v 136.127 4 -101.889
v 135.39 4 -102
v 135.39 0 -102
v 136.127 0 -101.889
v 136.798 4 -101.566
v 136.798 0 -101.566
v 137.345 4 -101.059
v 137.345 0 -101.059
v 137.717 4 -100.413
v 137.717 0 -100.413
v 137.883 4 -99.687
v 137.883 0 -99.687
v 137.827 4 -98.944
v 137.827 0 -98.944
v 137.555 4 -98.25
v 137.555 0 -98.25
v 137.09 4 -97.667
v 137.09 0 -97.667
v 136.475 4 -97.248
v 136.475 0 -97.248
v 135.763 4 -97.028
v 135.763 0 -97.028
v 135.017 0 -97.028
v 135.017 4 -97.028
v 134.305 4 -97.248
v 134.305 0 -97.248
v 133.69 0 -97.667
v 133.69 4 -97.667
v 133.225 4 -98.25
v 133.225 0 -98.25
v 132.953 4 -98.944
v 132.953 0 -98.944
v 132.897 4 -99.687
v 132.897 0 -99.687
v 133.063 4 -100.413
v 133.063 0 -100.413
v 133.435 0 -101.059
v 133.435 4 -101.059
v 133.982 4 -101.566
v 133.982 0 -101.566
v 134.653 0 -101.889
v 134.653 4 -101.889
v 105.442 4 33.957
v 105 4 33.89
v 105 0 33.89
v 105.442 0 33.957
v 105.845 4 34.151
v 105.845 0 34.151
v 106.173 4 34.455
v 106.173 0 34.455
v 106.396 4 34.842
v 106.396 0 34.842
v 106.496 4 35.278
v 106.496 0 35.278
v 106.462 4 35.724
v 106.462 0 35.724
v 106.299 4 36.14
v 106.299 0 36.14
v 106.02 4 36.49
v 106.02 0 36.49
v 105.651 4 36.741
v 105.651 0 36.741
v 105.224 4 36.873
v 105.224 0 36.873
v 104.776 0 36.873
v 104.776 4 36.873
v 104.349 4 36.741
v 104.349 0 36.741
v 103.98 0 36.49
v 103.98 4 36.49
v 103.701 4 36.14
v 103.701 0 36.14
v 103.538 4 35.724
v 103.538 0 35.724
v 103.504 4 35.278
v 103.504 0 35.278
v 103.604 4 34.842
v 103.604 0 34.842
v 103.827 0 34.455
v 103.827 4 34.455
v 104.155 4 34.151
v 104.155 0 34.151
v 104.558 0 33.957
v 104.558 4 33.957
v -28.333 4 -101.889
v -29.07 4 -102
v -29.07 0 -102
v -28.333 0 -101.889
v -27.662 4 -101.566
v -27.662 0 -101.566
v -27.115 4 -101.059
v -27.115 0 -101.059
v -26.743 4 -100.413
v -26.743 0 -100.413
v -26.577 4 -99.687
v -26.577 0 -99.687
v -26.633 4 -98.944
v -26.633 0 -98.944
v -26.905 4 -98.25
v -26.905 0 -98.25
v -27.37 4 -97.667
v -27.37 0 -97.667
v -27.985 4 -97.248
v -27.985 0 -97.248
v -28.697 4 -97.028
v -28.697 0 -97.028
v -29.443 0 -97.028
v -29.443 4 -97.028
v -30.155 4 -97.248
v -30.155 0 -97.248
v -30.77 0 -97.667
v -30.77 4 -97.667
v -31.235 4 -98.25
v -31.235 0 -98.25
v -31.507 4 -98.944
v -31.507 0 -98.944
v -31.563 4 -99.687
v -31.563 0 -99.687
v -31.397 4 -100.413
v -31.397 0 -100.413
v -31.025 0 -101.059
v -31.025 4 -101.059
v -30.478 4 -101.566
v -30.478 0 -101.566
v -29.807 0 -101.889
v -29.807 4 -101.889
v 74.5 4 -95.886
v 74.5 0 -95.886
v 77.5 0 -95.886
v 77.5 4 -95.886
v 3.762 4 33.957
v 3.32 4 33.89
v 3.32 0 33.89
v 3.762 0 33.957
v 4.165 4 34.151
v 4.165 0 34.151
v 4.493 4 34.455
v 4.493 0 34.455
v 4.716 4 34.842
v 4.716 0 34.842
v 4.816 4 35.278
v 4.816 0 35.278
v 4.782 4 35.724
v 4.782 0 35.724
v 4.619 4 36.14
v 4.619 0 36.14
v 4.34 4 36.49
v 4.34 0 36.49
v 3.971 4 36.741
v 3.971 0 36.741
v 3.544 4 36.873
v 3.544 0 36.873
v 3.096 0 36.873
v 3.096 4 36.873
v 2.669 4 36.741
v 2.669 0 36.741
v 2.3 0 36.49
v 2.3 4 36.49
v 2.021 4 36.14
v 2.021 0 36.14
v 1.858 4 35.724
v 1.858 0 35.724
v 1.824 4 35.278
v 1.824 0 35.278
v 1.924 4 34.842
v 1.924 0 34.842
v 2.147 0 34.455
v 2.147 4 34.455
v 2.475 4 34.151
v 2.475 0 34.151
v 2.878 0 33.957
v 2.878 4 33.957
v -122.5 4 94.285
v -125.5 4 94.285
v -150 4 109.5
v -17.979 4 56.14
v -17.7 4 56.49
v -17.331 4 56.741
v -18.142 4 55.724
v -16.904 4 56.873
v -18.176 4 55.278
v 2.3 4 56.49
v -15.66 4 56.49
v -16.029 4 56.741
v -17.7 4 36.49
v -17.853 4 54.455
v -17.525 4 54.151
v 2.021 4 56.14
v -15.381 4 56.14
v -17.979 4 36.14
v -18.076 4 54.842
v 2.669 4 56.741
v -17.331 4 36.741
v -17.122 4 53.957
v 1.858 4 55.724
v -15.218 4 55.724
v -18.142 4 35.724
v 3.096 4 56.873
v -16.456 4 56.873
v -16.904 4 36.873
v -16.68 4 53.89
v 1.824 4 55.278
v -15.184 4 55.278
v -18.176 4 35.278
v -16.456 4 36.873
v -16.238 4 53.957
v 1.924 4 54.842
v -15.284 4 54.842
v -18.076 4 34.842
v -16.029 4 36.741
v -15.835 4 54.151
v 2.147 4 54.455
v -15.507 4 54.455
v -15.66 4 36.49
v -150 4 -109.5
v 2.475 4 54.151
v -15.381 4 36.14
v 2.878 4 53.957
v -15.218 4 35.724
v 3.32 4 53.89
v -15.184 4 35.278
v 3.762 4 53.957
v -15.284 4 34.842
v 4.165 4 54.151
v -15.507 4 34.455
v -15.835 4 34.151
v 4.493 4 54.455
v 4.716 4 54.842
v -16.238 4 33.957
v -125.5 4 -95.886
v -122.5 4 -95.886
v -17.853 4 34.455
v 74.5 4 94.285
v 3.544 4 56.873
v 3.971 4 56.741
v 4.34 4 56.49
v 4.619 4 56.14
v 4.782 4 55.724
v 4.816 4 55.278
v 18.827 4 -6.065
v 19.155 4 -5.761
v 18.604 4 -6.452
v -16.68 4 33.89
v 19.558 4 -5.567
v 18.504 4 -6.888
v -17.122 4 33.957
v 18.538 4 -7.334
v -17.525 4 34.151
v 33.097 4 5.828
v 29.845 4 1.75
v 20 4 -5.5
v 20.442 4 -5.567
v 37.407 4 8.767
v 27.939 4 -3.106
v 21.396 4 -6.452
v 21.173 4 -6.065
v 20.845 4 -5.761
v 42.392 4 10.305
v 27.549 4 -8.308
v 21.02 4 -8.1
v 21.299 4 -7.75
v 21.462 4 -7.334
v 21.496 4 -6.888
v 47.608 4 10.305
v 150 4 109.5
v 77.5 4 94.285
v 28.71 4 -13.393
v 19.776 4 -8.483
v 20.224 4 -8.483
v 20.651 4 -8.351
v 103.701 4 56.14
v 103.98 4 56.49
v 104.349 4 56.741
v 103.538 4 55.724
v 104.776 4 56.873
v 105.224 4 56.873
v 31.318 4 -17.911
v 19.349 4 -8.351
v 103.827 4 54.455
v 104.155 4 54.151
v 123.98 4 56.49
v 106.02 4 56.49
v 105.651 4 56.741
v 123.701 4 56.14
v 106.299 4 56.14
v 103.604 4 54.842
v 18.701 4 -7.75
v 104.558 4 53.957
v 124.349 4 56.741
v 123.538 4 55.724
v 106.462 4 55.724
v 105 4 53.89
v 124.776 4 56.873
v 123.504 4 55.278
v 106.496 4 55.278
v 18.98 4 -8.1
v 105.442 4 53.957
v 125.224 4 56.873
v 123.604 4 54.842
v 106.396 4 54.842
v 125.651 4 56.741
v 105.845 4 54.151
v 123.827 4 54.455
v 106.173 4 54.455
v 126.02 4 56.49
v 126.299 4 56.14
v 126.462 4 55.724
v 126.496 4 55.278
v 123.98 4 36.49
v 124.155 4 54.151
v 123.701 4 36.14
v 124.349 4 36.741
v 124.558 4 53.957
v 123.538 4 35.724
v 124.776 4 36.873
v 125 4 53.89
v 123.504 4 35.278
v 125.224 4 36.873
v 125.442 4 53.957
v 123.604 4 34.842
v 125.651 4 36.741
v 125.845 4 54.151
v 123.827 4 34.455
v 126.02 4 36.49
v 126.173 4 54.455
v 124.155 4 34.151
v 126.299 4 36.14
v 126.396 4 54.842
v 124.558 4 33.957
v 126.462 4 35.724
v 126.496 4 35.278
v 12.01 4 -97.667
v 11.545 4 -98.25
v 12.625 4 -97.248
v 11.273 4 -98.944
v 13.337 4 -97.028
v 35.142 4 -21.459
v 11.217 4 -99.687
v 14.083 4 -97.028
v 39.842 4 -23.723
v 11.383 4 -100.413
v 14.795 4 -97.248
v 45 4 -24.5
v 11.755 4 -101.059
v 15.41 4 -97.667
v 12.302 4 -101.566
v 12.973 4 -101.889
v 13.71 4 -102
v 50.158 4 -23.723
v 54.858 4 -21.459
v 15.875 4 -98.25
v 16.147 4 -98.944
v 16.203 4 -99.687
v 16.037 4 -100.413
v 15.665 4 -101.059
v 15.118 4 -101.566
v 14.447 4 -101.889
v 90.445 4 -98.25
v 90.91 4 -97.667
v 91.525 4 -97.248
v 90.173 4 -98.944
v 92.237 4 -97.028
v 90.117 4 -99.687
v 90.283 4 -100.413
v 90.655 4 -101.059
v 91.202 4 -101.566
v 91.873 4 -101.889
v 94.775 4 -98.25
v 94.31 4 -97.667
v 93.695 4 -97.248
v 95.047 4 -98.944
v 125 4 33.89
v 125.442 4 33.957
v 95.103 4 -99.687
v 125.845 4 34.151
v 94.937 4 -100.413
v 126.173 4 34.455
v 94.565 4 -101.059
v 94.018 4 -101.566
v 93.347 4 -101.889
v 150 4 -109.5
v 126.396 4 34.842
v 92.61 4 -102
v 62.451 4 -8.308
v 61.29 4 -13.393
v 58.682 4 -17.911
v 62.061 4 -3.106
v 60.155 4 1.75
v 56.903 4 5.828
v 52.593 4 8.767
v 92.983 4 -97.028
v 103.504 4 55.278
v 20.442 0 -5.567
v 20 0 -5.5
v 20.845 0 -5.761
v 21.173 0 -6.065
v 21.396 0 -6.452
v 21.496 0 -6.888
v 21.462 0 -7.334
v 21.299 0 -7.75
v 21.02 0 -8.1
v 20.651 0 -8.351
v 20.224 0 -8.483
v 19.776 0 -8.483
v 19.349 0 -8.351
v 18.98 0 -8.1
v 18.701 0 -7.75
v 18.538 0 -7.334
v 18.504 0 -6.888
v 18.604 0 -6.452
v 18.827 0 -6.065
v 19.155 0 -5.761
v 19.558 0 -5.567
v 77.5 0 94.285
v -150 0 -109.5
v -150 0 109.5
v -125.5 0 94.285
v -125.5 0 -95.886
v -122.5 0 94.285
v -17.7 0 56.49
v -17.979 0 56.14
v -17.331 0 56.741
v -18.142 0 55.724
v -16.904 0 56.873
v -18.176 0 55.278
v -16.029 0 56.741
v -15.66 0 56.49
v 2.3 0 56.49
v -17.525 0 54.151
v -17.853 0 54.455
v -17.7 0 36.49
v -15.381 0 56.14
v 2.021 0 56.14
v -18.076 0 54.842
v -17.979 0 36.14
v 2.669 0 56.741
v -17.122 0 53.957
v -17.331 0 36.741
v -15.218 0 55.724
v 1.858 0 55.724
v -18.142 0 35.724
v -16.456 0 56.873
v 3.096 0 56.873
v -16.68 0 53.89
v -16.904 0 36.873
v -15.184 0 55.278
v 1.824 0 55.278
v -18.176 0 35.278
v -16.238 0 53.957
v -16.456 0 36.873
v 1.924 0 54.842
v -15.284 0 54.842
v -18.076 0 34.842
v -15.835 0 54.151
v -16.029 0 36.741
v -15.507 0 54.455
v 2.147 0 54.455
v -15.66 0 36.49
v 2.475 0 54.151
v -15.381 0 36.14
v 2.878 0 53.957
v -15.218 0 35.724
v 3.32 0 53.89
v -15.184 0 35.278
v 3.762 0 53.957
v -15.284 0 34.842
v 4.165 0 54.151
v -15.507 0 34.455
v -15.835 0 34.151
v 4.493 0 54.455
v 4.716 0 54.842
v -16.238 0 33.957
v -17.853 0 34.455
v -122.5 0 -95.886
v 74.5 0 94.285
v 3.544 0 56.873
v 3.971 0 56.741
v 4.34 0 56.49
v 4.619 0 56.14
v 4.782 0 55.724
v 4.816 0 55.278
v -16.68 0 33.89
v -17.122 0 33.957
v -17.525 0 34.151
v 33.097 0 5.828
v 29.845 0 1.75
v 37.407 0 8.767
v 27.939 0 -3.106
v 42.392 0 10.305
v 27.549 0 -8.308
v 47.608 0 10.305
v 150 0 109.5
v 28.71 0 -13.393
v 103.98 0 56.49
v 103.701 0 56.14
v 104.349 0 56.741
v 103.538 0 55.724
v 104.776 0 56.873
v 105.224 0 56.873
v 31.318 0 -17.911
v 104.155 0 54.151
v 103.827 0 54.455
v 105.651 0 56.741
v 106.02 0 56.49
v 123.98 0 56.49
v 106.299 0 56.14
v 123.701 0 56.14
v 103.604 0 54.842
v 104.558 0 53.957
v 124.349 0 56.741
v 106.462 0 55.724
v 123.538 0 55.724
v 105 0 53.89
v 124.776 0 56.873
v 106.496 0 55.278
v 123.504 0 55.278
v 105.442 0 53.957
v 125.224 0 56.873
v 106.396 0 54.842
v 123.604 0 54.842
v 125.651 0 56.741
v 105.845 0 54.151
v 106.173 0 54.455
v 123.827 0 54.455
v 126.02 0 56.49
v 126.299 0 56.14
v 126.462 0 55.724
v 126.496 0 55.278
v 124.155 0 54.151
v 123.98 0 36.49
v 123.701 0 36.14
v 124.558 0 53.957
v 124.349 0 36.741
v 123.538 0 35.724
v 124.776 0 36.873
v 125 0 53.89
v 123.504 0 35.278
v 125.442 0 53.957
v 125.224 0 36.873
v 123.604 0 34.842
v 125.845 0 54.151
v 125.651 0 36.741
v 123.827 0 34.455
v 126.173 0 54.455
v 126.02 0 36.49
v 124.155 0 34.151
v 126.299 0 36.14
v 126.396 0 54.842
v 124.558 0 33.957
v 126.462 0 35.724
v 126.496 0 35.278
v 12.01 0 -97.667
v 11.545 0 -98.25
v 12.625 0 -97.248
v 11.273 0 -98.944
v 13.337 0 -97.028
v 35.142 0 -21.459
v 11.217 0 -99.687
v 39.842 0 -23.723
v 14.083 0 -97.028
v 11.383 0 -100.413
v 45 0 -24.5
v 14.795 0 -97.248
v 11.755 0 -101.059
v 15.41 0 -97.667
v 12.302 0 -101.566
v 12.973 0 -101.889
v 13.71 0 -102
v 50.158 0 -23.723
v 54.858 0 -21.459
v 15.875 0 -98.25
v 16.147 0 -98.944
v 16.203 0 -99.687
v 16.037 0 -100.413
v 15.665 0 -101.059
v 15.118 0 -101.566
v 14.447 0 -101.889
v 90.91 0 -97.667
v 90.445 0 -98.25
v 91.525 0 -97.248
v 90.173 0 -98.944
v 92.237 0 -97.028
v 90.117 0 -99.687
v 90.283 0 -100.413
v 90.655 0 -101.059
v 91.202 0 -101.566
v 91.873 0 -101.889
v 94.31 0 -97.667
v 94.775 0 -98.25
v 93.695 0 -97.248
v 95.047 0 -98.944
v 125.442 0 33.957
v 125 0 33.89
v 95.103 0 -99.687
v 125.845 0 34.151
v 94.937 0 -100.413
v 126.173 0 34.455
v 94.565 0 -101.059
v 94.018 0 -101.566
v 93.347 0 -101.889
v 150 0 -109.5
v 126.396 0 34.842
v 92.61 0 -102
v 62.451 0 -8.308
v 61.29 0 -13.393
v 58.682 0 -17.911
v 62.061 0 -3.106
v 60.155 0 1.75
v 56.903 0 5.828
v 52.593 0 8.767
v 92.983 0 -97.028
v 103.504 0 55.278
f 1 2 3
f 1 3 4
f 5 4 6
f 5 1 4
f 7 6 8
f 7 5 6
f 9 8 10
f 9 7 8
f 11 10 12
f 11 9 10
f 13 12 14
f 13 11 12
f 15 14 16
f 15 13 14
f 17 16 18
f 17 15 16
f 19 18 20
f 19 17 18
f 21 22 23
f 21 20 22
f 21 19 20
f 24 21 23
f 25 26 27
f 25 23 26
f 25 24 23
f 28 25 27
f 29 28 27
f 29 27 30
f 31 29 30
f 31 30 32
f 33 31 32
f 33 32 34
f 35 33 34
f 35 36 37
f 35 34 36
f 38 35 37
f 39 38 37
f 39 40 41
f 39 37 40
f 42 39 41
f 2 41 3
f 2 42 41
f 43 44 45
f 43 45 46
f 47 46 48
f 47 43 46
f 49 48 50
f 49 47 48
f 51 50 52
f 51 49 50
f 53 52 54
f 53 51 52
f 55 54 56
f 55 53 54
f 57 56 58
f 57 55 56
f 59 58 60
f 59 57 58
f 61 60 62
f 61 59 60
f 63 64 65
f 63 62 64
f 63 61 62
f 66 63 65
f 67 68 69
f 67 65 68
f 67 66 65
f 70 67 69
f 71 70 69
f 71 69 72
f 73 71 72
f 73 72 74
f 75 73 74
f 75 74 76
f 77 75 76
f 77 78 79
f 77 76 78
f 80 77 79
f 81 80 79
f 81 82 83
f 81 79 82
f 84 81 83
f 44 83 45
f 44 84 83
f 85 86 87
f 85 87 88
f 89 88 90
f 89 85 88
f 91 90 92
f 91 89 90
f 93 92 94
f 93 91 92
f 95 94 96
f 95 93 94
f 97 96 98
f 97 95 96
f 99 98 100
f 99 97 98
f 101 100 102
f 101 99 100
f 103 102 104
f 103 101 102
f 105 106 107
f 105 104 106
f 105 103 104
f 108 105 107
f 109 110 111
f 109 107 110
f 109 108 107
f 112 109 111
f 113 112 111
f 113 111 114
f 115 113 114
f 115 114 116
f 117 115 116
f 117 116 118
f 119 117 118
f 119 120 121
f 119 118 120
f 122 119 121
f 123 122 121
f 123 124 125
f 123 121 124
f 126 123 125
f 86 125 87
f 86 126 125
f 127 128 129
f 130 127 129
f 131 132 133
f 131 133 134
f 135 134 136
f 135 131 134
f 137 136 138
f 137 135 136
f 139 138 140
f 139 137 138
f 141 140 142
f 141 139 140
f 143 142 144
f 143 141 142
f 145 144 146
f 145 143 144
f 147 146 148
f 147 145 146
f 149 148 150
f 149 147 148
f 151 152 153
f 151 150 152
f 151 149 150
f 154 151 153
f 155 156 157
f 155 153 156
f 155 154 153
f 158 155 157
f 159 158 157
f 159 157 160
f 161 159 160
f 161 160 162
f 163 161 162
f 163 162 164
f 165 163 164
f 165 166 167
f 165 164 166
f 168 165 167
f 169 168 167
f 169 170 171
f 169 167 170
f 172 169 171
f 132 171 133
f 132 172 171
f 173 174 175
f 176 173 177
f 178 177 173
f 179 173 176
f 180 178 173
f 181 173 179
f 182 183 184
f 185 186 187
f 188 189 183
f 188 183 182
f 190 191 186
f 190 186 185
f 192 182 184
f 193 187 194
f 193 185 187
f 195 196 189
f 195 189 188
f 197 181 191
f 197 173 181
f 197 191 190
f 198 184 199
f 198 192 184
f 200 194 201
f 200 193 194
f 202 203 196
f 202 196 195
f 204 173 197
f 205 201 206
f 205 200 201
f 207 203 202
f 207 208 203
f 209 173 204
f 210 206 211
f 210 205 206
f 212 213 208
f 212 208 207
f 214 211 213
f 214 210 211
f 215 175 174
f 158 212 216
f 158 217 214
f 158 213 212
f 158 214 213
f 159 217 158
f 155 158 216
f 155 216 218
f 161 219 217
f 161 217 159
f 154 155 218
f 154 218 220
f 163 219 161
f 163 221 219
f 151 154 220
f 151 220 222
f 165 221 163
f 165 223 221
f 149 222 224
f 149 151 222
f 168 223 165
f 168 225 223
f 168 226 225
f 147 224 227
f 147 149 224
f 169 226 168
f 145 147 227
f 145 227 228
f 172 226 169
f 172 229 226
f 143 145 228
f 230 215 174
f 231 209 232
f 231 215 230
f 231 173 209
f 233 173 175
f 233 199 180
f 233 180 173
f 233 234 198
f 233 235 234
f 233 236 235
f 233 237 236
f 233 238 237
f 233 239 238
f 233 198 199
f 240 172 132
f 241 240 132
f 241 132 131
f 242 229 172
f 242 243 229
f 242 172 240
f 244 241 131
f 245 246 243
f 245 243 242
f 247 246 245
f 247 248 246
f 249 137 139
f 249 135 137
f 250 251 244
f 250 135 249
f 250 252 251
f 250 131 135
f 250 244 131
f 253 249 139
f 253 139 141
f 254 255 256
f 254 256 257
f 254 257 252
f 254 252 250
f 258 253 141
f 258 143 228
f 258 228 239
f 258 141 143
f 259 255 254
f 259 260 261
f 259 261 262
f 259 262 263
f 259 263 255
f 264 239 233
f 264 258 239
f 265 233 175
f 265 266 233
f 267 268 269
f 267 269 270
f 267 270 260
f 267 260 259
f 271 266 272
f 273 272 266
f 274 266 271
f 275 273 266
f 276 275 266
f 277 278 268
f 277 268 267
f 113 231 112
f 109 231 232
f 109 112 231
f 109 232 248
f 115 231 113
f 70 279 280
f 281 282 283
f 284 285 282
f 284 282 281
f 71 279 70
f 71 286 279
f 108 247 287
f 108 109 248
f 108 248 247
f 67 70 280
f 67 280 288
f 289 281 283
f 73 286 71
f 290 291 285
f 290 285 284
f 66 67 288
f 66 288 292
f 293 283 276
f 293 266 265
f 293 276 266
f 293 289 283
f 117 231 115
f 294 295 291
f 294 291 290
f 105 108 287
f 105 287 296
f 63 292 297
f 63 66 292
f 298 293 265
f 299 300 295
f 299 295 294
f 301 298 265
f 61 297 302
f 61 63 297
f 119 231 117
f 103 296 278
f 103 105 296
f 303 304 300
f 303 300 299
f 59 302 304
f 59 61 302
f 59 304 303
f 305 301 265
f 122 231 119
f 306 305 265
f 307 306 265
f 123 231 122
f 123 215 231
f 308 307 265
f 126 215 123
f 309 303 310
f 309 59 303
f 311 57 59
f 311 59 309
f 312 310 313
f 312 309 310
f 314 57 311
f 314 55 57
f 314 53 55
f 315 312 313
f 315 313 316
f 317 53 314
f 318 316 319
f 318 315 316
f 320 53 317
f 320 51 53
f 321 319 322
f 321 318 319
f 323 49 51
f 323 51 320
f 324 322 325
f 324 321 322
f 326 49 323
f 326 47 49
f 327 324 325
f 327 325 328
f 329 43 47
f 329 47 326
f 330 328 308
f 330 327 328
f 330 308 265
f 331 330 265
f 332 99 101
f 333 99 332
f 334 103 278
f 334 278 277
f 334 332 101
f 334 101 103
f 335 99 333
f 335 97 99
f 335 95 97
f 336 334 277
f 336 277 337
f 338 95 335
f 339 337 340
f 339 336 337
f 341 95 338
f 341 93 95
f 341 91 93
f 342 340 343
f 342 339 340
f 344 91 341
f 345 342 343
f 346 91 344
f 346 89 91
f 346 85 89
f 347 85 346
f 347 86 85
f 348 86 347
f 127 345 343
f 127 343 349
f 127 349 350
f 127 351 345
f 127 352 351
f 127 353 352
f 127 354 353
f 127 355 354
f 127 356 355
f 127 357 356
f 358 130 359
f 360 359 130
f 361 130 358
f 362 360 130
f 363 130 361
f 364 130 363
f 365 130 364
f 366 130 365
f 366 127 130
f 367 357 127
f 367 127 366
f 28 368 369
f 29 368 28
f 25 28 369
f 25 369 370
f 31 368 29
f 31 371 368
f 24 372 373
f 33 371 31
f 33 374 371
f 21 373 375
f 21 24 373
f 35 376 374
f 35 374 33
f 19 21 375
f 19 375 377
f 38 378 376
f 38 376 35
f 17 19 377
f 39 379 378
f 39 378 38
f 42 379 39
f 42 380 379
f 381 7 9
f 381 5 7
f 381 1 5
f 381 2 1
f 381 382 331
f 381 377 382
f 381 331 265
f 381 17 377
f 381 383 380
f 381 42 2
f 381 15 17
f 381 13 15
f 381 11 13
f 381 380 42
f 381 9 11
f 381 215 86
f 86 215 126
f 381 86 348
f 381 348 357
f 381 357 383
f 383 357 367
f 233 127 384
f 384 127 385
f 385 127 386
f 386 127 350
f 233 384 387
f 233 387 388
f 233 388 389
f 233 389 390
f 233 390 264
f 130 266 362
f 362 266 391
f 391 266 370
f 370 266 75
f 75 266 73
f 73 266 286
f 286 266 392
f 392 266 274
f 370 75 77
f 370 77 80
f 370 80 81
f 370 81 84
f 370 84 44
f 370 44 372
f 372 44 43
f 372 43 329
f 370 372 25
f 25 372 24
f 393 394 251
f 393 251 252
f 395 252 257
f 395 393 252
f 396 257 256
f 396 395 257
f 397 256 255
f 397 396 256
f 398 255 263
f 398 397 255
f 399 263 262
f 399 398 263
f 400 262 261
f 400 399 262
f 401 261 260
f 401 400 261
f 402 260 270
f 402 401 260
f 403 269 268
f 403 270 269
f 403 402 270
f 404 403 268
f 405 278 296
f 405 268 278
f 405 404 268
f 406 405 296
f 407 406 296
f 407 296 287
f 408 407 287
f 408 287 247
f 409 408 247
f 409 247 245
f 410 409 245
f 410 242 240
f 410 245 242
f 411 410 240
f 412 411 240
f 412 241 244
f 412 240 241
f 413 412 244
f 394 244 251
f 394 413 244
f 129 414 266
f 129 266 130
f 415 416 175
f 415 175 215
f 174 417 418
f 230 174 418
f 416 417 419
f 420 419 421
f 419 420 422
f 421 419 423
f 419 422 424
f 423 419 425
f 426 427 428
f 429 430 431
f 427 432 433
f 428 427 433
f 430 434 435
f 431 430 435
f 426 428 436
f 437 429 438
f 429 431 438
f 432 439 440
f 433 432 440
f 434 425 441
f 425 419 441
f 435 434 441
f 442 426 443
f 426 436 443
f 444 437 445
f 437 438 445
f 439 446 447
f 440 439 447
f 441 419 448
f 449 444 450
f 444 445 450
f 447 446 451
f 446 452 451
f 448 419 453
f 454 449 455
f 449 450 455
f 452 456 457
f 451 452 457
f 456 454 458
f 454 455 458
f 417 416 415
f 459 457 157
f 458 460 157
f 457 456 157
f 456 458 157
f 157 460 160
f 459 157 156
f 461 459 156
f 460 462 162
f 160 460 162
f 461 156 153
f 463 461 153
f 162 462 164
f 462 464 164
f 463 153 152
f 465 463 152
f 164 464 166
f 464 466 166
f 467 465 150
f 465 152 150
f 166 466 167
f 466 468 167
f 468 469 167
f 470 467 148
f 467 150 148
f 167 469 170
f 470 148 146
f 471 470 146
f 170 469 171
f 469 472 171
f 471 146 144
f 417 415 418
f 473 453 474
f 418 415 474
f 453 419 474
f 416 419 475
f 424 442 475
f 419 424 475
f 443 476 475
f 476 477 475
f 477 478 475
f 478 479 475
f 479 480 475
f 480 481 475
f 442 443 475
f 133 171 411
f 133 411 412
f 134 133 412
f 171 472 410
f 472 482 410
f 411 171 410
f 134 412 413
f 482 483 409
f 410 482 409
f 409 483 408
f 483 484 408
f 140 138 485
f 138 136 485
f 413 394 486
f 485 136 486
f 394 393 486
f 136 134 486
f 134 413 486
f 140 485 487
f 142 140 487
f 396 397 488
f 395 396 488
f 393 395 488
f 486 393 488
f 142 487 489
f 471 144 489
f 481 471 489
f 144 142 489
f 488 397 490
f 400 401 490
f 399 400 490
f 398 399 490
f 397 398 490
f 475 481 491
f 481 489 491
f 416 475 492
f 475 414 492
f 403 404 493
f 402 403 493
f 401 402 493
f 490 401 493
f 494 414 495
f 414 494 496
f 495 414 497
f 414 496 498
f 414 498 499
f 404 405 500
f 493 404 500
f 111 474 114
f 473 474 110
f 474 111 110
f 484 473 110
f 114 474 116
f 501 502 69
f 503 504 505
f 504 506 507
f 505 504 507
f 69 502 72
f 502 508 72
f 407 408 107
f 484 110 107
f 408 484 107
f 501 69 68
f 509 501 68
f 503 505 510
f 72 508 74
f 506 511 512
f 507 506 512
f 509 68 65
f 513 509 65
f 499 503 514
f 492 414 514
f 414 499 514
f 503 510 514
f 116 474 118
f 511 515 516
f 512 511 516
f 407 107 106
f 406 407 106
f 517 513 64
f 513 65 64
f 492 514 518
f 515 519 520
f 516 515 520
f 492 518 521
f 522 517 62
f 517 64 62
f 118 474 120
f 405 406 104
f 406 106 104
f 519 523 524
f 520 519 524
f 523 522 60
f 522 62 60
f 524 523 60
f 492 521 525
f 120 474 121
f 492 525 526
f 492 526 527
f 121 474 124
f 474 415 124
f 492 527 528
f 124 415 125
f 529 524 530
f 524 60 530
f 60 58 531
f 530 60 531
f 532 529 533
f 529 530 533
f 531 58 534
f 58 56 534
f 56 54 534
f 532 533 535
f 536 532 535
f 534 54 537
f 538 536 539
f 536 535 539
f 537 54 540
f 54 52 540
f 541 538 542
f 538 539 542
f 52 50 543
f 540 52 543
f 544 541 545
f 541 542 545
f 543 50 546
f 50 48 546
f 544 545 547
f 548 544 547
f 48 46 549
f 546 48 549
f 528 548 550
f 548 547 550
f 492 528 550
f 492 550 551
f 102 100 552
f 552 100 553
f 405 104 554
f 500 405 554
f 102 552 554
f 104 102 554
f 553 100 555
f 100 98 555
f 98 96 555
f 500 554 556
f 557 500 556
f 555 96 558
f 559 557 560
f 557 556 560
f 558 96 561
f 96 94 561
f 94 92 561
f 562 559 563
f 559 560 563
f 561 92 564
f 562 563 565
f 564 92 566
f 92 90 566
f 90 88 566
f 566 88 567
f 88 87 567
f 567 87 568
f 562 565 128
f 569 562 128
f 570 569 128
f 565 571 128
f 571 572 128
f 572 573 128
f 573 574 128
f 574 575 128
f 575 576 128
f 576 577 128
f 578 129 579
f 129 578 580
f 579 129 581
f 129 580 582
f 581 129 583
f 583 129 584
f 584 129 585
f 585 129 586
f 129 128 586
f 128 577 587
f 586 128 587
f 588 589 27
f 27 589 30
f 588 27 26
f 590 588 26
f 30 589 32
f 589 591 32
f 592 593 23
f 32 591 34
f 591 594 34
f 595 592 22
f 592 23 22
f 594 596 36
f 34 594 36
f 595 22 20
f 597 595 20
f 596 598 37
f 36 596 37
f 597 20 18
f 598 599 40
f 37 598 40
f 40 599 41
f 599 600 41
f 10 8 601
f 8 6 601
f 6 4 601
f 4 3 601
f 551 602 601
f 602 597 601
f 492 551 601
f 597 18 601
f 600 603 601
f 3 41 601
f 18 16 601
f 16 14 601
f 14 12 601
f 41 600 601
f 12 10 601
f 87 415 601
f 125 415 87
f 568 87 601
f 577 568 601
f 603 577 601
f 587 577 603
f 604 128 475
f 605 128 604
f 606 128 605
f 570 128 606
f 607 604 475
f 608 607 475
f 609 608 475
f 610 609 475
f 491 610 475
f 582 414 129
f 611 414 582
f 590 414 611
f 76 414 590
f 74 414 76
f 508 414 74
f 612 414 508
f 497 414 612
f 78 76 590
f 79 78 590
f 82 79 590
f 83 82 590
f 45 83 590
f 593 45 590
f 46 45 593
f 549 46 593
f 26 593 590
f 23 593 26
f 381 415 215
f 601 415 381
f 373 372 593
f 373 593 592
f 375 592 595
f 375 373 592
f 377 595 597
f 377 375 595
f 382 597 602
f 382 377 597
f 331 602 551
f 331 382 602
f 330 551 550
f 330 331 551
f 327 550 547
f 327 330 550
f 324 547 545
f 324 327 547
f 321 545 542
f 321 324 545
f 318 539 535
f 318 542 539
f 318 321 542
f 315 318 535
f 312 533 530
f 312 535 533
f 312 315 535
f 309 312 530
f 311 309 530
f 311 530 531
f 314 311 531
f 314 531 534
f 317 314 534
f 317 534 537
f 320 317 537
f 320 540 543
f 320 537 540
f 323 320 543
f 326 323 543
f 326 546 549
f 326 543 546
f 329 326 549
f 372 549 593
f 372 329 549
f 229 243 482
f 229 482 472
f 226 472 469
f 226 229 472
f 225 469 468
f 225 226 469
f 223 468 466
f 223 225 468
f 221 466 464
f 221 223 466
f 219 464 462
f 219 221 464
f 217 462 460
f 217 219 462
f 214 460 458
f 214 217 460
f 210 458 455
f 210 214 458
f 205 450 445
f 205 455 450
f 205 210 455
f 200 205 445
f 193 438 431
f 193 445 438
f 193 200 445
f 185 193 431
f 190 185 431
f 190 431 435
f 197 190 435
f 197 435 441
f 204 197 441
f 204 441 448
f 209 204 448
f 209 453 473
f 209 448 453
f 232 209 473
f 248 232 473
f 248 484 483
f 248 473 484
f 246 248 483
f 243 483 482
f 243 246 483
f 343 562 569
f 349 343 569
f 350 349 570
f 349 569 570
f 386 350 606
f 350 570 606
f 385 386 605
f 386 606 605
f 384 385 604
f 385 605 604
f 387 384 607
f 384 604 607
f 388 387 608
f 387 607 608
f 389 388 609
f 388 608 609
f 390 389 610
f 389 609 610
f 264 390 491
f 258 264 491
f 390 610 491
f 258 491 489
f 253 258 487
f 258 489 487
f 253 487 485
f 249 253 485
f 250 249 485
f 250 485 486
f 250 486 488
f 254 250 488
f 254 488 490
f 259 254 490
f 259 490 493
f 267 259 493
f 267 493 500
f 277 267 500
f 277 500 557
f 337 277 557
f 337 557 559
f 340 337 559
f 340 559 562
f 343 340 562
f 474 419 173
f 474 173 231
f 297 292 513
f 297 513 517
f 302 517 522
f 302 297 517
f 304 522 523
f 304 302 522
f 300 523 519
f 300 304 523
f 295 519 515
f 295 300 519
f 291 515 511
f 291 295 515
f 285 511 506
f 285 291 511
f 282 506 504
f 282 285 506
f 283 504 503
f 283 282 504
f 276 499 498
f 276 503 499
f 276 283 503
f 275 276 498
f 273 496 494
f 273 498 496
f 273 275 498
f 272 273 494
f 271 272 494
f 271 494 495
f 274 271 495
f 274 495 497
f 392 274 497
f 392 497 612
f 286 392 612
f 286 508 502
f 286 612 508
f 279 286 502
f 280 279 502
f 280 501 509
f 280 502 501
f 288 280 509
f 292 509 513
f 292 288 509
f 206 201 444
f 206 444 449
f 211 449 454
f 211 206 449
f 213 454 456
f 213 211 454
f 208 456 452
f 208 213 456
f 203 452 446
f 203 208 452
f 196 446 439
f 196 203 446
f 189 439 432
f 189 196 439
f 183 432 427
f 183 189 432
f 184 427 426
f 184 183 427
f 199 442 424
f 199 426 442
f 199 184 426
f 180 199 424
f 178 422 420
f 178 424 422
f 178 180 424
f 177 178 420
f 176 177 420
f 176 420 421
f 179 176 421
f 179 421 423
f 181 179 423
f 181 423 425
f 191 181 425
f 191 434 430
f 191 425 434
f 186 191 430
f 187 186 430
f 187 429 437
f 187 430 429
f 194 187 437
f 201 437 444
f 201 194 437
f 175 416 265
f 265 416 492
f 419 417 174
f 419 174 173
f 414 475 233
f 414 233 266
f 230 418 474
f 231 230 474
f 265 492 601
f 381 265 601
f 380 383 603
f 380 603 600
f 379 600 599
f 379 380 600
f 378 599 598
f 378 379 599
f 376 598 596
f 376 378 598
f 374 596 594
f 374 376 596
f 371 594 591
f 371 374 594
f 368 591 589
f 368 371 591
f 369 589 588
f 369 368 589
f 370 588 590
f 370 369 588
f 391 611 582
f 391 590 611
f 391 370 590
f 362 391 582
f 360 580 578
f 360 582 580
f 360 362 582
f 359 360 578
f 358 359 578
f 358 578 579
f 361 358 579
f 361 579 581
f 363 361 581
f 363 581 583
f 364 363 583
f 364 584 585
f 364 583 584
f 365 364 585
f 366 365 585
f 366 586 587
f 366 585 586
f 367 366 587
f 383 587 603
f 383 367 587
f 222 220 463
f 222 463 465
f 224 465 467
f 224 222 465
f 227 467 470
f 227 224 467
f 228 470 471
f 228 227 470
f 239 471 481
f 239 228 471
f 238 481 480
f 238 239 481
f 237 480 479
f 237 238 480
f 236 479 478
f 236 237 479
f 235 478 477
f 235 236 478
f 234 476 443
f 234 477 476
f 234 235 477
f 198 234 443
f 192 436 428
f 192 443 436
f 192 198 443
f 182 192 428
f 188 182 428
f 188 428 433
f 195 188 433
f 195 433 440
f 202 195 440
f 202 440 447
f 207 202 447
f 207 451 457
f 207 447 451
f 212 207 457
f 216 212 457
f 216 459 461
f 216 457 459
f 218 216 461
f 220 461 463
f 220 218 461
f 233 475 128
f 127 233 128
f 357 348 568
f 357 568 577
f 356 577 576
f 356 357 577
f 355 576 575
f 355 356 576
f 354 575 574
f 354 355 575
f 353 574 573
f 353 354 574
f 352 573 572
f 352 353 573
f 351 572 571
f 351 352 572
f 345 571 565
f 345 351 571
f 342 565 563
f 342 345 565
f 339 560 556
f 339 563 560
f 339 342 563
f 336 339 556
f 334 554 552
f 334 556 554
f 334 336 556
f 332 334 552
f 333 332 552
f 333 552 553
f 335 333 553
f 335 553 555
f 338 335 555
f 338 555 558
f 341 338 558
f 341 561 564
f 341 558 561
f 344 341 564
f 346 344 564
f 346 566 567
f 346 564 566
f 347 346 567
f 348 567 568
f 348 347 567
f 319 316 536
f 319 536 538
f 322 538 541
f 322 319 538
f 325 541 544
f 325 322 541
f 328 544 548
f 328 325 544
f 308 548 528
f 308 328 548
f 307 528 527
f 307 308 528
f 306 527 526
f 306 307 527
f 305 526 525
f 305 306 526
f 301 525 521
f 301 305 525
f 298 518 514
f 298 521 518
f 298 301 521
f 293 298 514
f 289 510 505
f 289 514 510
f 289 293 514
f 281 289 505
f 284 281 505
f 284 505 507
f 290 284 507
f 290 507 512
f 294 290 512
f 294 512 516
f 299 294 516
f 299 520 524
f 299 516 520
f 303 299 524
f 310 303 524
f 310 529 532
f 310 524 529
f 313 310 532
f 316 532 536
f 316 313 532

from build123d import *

# Parameters (mm, degrees)
SKETCH1_W               = 300
SKETCH1_H               = 219
SKETCH1_W_2             = 3
SKETCH1_H_2             = 190.1710485
BOSS_EXTRUDE1_DEPTH     = 4
SKETCH2_R               = 17.5
CUT_EXTRUDE2_DEPTH      = 186.758579883
CUT_EXTRUDE3_DEPTH      = 186.758579883
CUT_EXTRUDE3_DEPTH_BACK = 186.758579883
SKETCH3_R               = 1.5
CUT_EXTRUDE4_DEPTH      = 186.758579883
CUT_EXTRUDE4_DEPTH_BACK = 186.758579883
SKETCH4_R               = 1.5
CUT_EXTRUDE5_DEPTH      = 186.758579883
CUT_EXTRUDE5_DEPTH_BACK = 186.758579883
SKETCH5_R               = 2.5
CUT_EXTRUDE6_DEPTH      = 186.758579883
CUT_EXTRUDE6_DEPTH_BACK = 186.758579883
SKETCH6_R               = 2.5
CUT_EXTRUDE7_DEPTH      = 186.758579883
CUT_EXTRUDE7_DEPTH_BACK = 186.758579883
SKETCH7_R               = 1.5


with BuildPart() as part:
    # Sketch1 → Boss-Extrude1 (new body)
    with BuildSketch(Plane(origin=(0, 0, 0), x_dir=(1, 0, 0), z_dir=(0, 1, 0))):
        Rectangle(SKETCH1_W, SKETCH1_H)
        with Locations((-124, 0.80041533)):
            Rectangle(SKETCH1_W_2, SKETCH1_H_2, mode=Mode.SUBTRACT)
        with Locations((76, 0.80041533)):
            Rectangle(SKETCH1_W_2, SKETCH1_H_2, mode=Mode.SUBTRACT)
    extrude(amount=BOSS_EXTRUDE1_DEPTH)

    # Sketch2 → Cut-Extrude2 (cut, through all)
    with BuildSketch(Plane(origin=(0, 0, 0), x_dir=(-1, 0, 0), z_dir=(0, -1, 0))):
        with Locations(Location((-45, 7, 0), (0, 0, 90))):
            Circle(SKETCH2_R)
    extrude(amount=-CUT_EXTRUDE2_DEPTH, mode=Mode.SUBTRACT)

    # Sketch3 → Cut-Extrude3 (cut, two sides: drawn at the far end of the back side and taken through both)
    with BuildSketch(Plane(origin=(0, 0, 0), x_dir=(-1, 0, 0), z_dir=(0, -1, 0)).offset(-CUT_EXTRUDE3_DEPTH_BACK)):
        with Locations(Location((-125, -55.39, 0), (0, 0, 90))):
            Circle(SKETCH3_R)
        with Locations(Location((-125, -35.39, 0), (0, 0, 90))):
            Circle(SKETCH3_R)
        with Locations(Location((-105, -35.39, 0), (0, 0, 90))):
            Circle(SKETCH3_R)
        with Locations(Location((-105, -55.39, 0), (0, 0, 90))):
            Circle(SKETCH3_R)
    extrude(amount=CUT_EXTRUDE3_DEPTH + CUT_EXTRUDE3_DEPTH_BACK, mode=Mode.SUBTRACT)

    # Sketch4 → Cut-Extrude4 (cut, two sides: drawn at the far end of the back side and taken through both)
    with BuildSketch(Plane(origin=(0, 0, 0), x_dir=(-1, 0, 0), z_dir=(0, -1, 0)).offset(-CUT_EXTRUDE4_DEPTH_BACK)):
        with Locations(Location((-3.32, -55.39, 0), (0, 0, 90))):
            Circle(SKETCH4_R)
        with Locations(Location((-3.32, -35.39, 0), (0, 0, 90))):
            Circle(SKETCH4_R)
        with Locations(Location((16.68, -35.39, 0), (0, 0, 90))):
            Circle(SKETCH4_R)
        with Locations(Location((16.68, -55.39, 0), (0, 0, 90))):
            Circle(SKETCH4_R)
    extrude(amount=CUT_EXTRUDE4_DEPTH + CUT_EXTRUDE4_DEPTH_BACK, mode=Mode.SUBTRACT)

    # Sketch5 → Cut-Extrude5 (cut, two sides: drawn at the far end of the back side and taken through both)
    with BuildSketch(Plane(origin=(0, 0, 0), x_dir=(-1, 0, 0), z_dir=(0, -1, 0)).offset(-CUT_EXTRUDE5_DEPTH_BACK)):
        with Locations(Location((-135.39, 99.5, 0), (0, 0, 90))):
            Circle(SKETCH5_R)
        with Locations(Location((-92.61, 99.5, 0), (0, 0, 90))):
            Circle(SKETCH5_R)
    extrude(amount=CUT_EXTRUDE5_DEPTH + CUT_EXTRUDE5_DEPTH_BACK, mode=Mode.SUBTRACT)

    # Sketch6 → Cut-Extrude6 (cut, two sides: drawn at the far end of the back side and taken through both)
    with BuildSketch(Plane.XZ.offset(-CUT_EXTRUDE6_DEPTH_BACK)):
        with Locations(Location((13.71, -99.5, 0), (0, 0, 270))):
            Circle(SKETCH6_R)
        with Locations(Location((-29.07, -99.5, 0), (0, 0, 270))):
            Circle(SKETCH6_R)
    extrude(amount=CUT_EXTRUDE6_DEPTH + CUT_EXTRUDE6_DEPTH_BACK, mode=Mode.SUBTRACT)

    # Sketch7 → Cut-Extrude7 (cut, two sides: drawn at the far end of the back side and taken through both)
    with BuildSketch(Plane(origin=(0, 4, 0), x_dir=(1, 0, 0), z_dir=(0, 1, 0)).offset(-CUT_EXTRUDE7_DEPTH_BACK)):
        with Locations(Location((20, 7, 0), (0, 0, 270))):
            Circle(SKETCH7_R)
    extrude(amount=CUT_EXTRUDE7_DEPTH + CUT_EXTRUDE7_DEPTH_BACK, mode=Mode.SUBTRACT)


solid = part.part
